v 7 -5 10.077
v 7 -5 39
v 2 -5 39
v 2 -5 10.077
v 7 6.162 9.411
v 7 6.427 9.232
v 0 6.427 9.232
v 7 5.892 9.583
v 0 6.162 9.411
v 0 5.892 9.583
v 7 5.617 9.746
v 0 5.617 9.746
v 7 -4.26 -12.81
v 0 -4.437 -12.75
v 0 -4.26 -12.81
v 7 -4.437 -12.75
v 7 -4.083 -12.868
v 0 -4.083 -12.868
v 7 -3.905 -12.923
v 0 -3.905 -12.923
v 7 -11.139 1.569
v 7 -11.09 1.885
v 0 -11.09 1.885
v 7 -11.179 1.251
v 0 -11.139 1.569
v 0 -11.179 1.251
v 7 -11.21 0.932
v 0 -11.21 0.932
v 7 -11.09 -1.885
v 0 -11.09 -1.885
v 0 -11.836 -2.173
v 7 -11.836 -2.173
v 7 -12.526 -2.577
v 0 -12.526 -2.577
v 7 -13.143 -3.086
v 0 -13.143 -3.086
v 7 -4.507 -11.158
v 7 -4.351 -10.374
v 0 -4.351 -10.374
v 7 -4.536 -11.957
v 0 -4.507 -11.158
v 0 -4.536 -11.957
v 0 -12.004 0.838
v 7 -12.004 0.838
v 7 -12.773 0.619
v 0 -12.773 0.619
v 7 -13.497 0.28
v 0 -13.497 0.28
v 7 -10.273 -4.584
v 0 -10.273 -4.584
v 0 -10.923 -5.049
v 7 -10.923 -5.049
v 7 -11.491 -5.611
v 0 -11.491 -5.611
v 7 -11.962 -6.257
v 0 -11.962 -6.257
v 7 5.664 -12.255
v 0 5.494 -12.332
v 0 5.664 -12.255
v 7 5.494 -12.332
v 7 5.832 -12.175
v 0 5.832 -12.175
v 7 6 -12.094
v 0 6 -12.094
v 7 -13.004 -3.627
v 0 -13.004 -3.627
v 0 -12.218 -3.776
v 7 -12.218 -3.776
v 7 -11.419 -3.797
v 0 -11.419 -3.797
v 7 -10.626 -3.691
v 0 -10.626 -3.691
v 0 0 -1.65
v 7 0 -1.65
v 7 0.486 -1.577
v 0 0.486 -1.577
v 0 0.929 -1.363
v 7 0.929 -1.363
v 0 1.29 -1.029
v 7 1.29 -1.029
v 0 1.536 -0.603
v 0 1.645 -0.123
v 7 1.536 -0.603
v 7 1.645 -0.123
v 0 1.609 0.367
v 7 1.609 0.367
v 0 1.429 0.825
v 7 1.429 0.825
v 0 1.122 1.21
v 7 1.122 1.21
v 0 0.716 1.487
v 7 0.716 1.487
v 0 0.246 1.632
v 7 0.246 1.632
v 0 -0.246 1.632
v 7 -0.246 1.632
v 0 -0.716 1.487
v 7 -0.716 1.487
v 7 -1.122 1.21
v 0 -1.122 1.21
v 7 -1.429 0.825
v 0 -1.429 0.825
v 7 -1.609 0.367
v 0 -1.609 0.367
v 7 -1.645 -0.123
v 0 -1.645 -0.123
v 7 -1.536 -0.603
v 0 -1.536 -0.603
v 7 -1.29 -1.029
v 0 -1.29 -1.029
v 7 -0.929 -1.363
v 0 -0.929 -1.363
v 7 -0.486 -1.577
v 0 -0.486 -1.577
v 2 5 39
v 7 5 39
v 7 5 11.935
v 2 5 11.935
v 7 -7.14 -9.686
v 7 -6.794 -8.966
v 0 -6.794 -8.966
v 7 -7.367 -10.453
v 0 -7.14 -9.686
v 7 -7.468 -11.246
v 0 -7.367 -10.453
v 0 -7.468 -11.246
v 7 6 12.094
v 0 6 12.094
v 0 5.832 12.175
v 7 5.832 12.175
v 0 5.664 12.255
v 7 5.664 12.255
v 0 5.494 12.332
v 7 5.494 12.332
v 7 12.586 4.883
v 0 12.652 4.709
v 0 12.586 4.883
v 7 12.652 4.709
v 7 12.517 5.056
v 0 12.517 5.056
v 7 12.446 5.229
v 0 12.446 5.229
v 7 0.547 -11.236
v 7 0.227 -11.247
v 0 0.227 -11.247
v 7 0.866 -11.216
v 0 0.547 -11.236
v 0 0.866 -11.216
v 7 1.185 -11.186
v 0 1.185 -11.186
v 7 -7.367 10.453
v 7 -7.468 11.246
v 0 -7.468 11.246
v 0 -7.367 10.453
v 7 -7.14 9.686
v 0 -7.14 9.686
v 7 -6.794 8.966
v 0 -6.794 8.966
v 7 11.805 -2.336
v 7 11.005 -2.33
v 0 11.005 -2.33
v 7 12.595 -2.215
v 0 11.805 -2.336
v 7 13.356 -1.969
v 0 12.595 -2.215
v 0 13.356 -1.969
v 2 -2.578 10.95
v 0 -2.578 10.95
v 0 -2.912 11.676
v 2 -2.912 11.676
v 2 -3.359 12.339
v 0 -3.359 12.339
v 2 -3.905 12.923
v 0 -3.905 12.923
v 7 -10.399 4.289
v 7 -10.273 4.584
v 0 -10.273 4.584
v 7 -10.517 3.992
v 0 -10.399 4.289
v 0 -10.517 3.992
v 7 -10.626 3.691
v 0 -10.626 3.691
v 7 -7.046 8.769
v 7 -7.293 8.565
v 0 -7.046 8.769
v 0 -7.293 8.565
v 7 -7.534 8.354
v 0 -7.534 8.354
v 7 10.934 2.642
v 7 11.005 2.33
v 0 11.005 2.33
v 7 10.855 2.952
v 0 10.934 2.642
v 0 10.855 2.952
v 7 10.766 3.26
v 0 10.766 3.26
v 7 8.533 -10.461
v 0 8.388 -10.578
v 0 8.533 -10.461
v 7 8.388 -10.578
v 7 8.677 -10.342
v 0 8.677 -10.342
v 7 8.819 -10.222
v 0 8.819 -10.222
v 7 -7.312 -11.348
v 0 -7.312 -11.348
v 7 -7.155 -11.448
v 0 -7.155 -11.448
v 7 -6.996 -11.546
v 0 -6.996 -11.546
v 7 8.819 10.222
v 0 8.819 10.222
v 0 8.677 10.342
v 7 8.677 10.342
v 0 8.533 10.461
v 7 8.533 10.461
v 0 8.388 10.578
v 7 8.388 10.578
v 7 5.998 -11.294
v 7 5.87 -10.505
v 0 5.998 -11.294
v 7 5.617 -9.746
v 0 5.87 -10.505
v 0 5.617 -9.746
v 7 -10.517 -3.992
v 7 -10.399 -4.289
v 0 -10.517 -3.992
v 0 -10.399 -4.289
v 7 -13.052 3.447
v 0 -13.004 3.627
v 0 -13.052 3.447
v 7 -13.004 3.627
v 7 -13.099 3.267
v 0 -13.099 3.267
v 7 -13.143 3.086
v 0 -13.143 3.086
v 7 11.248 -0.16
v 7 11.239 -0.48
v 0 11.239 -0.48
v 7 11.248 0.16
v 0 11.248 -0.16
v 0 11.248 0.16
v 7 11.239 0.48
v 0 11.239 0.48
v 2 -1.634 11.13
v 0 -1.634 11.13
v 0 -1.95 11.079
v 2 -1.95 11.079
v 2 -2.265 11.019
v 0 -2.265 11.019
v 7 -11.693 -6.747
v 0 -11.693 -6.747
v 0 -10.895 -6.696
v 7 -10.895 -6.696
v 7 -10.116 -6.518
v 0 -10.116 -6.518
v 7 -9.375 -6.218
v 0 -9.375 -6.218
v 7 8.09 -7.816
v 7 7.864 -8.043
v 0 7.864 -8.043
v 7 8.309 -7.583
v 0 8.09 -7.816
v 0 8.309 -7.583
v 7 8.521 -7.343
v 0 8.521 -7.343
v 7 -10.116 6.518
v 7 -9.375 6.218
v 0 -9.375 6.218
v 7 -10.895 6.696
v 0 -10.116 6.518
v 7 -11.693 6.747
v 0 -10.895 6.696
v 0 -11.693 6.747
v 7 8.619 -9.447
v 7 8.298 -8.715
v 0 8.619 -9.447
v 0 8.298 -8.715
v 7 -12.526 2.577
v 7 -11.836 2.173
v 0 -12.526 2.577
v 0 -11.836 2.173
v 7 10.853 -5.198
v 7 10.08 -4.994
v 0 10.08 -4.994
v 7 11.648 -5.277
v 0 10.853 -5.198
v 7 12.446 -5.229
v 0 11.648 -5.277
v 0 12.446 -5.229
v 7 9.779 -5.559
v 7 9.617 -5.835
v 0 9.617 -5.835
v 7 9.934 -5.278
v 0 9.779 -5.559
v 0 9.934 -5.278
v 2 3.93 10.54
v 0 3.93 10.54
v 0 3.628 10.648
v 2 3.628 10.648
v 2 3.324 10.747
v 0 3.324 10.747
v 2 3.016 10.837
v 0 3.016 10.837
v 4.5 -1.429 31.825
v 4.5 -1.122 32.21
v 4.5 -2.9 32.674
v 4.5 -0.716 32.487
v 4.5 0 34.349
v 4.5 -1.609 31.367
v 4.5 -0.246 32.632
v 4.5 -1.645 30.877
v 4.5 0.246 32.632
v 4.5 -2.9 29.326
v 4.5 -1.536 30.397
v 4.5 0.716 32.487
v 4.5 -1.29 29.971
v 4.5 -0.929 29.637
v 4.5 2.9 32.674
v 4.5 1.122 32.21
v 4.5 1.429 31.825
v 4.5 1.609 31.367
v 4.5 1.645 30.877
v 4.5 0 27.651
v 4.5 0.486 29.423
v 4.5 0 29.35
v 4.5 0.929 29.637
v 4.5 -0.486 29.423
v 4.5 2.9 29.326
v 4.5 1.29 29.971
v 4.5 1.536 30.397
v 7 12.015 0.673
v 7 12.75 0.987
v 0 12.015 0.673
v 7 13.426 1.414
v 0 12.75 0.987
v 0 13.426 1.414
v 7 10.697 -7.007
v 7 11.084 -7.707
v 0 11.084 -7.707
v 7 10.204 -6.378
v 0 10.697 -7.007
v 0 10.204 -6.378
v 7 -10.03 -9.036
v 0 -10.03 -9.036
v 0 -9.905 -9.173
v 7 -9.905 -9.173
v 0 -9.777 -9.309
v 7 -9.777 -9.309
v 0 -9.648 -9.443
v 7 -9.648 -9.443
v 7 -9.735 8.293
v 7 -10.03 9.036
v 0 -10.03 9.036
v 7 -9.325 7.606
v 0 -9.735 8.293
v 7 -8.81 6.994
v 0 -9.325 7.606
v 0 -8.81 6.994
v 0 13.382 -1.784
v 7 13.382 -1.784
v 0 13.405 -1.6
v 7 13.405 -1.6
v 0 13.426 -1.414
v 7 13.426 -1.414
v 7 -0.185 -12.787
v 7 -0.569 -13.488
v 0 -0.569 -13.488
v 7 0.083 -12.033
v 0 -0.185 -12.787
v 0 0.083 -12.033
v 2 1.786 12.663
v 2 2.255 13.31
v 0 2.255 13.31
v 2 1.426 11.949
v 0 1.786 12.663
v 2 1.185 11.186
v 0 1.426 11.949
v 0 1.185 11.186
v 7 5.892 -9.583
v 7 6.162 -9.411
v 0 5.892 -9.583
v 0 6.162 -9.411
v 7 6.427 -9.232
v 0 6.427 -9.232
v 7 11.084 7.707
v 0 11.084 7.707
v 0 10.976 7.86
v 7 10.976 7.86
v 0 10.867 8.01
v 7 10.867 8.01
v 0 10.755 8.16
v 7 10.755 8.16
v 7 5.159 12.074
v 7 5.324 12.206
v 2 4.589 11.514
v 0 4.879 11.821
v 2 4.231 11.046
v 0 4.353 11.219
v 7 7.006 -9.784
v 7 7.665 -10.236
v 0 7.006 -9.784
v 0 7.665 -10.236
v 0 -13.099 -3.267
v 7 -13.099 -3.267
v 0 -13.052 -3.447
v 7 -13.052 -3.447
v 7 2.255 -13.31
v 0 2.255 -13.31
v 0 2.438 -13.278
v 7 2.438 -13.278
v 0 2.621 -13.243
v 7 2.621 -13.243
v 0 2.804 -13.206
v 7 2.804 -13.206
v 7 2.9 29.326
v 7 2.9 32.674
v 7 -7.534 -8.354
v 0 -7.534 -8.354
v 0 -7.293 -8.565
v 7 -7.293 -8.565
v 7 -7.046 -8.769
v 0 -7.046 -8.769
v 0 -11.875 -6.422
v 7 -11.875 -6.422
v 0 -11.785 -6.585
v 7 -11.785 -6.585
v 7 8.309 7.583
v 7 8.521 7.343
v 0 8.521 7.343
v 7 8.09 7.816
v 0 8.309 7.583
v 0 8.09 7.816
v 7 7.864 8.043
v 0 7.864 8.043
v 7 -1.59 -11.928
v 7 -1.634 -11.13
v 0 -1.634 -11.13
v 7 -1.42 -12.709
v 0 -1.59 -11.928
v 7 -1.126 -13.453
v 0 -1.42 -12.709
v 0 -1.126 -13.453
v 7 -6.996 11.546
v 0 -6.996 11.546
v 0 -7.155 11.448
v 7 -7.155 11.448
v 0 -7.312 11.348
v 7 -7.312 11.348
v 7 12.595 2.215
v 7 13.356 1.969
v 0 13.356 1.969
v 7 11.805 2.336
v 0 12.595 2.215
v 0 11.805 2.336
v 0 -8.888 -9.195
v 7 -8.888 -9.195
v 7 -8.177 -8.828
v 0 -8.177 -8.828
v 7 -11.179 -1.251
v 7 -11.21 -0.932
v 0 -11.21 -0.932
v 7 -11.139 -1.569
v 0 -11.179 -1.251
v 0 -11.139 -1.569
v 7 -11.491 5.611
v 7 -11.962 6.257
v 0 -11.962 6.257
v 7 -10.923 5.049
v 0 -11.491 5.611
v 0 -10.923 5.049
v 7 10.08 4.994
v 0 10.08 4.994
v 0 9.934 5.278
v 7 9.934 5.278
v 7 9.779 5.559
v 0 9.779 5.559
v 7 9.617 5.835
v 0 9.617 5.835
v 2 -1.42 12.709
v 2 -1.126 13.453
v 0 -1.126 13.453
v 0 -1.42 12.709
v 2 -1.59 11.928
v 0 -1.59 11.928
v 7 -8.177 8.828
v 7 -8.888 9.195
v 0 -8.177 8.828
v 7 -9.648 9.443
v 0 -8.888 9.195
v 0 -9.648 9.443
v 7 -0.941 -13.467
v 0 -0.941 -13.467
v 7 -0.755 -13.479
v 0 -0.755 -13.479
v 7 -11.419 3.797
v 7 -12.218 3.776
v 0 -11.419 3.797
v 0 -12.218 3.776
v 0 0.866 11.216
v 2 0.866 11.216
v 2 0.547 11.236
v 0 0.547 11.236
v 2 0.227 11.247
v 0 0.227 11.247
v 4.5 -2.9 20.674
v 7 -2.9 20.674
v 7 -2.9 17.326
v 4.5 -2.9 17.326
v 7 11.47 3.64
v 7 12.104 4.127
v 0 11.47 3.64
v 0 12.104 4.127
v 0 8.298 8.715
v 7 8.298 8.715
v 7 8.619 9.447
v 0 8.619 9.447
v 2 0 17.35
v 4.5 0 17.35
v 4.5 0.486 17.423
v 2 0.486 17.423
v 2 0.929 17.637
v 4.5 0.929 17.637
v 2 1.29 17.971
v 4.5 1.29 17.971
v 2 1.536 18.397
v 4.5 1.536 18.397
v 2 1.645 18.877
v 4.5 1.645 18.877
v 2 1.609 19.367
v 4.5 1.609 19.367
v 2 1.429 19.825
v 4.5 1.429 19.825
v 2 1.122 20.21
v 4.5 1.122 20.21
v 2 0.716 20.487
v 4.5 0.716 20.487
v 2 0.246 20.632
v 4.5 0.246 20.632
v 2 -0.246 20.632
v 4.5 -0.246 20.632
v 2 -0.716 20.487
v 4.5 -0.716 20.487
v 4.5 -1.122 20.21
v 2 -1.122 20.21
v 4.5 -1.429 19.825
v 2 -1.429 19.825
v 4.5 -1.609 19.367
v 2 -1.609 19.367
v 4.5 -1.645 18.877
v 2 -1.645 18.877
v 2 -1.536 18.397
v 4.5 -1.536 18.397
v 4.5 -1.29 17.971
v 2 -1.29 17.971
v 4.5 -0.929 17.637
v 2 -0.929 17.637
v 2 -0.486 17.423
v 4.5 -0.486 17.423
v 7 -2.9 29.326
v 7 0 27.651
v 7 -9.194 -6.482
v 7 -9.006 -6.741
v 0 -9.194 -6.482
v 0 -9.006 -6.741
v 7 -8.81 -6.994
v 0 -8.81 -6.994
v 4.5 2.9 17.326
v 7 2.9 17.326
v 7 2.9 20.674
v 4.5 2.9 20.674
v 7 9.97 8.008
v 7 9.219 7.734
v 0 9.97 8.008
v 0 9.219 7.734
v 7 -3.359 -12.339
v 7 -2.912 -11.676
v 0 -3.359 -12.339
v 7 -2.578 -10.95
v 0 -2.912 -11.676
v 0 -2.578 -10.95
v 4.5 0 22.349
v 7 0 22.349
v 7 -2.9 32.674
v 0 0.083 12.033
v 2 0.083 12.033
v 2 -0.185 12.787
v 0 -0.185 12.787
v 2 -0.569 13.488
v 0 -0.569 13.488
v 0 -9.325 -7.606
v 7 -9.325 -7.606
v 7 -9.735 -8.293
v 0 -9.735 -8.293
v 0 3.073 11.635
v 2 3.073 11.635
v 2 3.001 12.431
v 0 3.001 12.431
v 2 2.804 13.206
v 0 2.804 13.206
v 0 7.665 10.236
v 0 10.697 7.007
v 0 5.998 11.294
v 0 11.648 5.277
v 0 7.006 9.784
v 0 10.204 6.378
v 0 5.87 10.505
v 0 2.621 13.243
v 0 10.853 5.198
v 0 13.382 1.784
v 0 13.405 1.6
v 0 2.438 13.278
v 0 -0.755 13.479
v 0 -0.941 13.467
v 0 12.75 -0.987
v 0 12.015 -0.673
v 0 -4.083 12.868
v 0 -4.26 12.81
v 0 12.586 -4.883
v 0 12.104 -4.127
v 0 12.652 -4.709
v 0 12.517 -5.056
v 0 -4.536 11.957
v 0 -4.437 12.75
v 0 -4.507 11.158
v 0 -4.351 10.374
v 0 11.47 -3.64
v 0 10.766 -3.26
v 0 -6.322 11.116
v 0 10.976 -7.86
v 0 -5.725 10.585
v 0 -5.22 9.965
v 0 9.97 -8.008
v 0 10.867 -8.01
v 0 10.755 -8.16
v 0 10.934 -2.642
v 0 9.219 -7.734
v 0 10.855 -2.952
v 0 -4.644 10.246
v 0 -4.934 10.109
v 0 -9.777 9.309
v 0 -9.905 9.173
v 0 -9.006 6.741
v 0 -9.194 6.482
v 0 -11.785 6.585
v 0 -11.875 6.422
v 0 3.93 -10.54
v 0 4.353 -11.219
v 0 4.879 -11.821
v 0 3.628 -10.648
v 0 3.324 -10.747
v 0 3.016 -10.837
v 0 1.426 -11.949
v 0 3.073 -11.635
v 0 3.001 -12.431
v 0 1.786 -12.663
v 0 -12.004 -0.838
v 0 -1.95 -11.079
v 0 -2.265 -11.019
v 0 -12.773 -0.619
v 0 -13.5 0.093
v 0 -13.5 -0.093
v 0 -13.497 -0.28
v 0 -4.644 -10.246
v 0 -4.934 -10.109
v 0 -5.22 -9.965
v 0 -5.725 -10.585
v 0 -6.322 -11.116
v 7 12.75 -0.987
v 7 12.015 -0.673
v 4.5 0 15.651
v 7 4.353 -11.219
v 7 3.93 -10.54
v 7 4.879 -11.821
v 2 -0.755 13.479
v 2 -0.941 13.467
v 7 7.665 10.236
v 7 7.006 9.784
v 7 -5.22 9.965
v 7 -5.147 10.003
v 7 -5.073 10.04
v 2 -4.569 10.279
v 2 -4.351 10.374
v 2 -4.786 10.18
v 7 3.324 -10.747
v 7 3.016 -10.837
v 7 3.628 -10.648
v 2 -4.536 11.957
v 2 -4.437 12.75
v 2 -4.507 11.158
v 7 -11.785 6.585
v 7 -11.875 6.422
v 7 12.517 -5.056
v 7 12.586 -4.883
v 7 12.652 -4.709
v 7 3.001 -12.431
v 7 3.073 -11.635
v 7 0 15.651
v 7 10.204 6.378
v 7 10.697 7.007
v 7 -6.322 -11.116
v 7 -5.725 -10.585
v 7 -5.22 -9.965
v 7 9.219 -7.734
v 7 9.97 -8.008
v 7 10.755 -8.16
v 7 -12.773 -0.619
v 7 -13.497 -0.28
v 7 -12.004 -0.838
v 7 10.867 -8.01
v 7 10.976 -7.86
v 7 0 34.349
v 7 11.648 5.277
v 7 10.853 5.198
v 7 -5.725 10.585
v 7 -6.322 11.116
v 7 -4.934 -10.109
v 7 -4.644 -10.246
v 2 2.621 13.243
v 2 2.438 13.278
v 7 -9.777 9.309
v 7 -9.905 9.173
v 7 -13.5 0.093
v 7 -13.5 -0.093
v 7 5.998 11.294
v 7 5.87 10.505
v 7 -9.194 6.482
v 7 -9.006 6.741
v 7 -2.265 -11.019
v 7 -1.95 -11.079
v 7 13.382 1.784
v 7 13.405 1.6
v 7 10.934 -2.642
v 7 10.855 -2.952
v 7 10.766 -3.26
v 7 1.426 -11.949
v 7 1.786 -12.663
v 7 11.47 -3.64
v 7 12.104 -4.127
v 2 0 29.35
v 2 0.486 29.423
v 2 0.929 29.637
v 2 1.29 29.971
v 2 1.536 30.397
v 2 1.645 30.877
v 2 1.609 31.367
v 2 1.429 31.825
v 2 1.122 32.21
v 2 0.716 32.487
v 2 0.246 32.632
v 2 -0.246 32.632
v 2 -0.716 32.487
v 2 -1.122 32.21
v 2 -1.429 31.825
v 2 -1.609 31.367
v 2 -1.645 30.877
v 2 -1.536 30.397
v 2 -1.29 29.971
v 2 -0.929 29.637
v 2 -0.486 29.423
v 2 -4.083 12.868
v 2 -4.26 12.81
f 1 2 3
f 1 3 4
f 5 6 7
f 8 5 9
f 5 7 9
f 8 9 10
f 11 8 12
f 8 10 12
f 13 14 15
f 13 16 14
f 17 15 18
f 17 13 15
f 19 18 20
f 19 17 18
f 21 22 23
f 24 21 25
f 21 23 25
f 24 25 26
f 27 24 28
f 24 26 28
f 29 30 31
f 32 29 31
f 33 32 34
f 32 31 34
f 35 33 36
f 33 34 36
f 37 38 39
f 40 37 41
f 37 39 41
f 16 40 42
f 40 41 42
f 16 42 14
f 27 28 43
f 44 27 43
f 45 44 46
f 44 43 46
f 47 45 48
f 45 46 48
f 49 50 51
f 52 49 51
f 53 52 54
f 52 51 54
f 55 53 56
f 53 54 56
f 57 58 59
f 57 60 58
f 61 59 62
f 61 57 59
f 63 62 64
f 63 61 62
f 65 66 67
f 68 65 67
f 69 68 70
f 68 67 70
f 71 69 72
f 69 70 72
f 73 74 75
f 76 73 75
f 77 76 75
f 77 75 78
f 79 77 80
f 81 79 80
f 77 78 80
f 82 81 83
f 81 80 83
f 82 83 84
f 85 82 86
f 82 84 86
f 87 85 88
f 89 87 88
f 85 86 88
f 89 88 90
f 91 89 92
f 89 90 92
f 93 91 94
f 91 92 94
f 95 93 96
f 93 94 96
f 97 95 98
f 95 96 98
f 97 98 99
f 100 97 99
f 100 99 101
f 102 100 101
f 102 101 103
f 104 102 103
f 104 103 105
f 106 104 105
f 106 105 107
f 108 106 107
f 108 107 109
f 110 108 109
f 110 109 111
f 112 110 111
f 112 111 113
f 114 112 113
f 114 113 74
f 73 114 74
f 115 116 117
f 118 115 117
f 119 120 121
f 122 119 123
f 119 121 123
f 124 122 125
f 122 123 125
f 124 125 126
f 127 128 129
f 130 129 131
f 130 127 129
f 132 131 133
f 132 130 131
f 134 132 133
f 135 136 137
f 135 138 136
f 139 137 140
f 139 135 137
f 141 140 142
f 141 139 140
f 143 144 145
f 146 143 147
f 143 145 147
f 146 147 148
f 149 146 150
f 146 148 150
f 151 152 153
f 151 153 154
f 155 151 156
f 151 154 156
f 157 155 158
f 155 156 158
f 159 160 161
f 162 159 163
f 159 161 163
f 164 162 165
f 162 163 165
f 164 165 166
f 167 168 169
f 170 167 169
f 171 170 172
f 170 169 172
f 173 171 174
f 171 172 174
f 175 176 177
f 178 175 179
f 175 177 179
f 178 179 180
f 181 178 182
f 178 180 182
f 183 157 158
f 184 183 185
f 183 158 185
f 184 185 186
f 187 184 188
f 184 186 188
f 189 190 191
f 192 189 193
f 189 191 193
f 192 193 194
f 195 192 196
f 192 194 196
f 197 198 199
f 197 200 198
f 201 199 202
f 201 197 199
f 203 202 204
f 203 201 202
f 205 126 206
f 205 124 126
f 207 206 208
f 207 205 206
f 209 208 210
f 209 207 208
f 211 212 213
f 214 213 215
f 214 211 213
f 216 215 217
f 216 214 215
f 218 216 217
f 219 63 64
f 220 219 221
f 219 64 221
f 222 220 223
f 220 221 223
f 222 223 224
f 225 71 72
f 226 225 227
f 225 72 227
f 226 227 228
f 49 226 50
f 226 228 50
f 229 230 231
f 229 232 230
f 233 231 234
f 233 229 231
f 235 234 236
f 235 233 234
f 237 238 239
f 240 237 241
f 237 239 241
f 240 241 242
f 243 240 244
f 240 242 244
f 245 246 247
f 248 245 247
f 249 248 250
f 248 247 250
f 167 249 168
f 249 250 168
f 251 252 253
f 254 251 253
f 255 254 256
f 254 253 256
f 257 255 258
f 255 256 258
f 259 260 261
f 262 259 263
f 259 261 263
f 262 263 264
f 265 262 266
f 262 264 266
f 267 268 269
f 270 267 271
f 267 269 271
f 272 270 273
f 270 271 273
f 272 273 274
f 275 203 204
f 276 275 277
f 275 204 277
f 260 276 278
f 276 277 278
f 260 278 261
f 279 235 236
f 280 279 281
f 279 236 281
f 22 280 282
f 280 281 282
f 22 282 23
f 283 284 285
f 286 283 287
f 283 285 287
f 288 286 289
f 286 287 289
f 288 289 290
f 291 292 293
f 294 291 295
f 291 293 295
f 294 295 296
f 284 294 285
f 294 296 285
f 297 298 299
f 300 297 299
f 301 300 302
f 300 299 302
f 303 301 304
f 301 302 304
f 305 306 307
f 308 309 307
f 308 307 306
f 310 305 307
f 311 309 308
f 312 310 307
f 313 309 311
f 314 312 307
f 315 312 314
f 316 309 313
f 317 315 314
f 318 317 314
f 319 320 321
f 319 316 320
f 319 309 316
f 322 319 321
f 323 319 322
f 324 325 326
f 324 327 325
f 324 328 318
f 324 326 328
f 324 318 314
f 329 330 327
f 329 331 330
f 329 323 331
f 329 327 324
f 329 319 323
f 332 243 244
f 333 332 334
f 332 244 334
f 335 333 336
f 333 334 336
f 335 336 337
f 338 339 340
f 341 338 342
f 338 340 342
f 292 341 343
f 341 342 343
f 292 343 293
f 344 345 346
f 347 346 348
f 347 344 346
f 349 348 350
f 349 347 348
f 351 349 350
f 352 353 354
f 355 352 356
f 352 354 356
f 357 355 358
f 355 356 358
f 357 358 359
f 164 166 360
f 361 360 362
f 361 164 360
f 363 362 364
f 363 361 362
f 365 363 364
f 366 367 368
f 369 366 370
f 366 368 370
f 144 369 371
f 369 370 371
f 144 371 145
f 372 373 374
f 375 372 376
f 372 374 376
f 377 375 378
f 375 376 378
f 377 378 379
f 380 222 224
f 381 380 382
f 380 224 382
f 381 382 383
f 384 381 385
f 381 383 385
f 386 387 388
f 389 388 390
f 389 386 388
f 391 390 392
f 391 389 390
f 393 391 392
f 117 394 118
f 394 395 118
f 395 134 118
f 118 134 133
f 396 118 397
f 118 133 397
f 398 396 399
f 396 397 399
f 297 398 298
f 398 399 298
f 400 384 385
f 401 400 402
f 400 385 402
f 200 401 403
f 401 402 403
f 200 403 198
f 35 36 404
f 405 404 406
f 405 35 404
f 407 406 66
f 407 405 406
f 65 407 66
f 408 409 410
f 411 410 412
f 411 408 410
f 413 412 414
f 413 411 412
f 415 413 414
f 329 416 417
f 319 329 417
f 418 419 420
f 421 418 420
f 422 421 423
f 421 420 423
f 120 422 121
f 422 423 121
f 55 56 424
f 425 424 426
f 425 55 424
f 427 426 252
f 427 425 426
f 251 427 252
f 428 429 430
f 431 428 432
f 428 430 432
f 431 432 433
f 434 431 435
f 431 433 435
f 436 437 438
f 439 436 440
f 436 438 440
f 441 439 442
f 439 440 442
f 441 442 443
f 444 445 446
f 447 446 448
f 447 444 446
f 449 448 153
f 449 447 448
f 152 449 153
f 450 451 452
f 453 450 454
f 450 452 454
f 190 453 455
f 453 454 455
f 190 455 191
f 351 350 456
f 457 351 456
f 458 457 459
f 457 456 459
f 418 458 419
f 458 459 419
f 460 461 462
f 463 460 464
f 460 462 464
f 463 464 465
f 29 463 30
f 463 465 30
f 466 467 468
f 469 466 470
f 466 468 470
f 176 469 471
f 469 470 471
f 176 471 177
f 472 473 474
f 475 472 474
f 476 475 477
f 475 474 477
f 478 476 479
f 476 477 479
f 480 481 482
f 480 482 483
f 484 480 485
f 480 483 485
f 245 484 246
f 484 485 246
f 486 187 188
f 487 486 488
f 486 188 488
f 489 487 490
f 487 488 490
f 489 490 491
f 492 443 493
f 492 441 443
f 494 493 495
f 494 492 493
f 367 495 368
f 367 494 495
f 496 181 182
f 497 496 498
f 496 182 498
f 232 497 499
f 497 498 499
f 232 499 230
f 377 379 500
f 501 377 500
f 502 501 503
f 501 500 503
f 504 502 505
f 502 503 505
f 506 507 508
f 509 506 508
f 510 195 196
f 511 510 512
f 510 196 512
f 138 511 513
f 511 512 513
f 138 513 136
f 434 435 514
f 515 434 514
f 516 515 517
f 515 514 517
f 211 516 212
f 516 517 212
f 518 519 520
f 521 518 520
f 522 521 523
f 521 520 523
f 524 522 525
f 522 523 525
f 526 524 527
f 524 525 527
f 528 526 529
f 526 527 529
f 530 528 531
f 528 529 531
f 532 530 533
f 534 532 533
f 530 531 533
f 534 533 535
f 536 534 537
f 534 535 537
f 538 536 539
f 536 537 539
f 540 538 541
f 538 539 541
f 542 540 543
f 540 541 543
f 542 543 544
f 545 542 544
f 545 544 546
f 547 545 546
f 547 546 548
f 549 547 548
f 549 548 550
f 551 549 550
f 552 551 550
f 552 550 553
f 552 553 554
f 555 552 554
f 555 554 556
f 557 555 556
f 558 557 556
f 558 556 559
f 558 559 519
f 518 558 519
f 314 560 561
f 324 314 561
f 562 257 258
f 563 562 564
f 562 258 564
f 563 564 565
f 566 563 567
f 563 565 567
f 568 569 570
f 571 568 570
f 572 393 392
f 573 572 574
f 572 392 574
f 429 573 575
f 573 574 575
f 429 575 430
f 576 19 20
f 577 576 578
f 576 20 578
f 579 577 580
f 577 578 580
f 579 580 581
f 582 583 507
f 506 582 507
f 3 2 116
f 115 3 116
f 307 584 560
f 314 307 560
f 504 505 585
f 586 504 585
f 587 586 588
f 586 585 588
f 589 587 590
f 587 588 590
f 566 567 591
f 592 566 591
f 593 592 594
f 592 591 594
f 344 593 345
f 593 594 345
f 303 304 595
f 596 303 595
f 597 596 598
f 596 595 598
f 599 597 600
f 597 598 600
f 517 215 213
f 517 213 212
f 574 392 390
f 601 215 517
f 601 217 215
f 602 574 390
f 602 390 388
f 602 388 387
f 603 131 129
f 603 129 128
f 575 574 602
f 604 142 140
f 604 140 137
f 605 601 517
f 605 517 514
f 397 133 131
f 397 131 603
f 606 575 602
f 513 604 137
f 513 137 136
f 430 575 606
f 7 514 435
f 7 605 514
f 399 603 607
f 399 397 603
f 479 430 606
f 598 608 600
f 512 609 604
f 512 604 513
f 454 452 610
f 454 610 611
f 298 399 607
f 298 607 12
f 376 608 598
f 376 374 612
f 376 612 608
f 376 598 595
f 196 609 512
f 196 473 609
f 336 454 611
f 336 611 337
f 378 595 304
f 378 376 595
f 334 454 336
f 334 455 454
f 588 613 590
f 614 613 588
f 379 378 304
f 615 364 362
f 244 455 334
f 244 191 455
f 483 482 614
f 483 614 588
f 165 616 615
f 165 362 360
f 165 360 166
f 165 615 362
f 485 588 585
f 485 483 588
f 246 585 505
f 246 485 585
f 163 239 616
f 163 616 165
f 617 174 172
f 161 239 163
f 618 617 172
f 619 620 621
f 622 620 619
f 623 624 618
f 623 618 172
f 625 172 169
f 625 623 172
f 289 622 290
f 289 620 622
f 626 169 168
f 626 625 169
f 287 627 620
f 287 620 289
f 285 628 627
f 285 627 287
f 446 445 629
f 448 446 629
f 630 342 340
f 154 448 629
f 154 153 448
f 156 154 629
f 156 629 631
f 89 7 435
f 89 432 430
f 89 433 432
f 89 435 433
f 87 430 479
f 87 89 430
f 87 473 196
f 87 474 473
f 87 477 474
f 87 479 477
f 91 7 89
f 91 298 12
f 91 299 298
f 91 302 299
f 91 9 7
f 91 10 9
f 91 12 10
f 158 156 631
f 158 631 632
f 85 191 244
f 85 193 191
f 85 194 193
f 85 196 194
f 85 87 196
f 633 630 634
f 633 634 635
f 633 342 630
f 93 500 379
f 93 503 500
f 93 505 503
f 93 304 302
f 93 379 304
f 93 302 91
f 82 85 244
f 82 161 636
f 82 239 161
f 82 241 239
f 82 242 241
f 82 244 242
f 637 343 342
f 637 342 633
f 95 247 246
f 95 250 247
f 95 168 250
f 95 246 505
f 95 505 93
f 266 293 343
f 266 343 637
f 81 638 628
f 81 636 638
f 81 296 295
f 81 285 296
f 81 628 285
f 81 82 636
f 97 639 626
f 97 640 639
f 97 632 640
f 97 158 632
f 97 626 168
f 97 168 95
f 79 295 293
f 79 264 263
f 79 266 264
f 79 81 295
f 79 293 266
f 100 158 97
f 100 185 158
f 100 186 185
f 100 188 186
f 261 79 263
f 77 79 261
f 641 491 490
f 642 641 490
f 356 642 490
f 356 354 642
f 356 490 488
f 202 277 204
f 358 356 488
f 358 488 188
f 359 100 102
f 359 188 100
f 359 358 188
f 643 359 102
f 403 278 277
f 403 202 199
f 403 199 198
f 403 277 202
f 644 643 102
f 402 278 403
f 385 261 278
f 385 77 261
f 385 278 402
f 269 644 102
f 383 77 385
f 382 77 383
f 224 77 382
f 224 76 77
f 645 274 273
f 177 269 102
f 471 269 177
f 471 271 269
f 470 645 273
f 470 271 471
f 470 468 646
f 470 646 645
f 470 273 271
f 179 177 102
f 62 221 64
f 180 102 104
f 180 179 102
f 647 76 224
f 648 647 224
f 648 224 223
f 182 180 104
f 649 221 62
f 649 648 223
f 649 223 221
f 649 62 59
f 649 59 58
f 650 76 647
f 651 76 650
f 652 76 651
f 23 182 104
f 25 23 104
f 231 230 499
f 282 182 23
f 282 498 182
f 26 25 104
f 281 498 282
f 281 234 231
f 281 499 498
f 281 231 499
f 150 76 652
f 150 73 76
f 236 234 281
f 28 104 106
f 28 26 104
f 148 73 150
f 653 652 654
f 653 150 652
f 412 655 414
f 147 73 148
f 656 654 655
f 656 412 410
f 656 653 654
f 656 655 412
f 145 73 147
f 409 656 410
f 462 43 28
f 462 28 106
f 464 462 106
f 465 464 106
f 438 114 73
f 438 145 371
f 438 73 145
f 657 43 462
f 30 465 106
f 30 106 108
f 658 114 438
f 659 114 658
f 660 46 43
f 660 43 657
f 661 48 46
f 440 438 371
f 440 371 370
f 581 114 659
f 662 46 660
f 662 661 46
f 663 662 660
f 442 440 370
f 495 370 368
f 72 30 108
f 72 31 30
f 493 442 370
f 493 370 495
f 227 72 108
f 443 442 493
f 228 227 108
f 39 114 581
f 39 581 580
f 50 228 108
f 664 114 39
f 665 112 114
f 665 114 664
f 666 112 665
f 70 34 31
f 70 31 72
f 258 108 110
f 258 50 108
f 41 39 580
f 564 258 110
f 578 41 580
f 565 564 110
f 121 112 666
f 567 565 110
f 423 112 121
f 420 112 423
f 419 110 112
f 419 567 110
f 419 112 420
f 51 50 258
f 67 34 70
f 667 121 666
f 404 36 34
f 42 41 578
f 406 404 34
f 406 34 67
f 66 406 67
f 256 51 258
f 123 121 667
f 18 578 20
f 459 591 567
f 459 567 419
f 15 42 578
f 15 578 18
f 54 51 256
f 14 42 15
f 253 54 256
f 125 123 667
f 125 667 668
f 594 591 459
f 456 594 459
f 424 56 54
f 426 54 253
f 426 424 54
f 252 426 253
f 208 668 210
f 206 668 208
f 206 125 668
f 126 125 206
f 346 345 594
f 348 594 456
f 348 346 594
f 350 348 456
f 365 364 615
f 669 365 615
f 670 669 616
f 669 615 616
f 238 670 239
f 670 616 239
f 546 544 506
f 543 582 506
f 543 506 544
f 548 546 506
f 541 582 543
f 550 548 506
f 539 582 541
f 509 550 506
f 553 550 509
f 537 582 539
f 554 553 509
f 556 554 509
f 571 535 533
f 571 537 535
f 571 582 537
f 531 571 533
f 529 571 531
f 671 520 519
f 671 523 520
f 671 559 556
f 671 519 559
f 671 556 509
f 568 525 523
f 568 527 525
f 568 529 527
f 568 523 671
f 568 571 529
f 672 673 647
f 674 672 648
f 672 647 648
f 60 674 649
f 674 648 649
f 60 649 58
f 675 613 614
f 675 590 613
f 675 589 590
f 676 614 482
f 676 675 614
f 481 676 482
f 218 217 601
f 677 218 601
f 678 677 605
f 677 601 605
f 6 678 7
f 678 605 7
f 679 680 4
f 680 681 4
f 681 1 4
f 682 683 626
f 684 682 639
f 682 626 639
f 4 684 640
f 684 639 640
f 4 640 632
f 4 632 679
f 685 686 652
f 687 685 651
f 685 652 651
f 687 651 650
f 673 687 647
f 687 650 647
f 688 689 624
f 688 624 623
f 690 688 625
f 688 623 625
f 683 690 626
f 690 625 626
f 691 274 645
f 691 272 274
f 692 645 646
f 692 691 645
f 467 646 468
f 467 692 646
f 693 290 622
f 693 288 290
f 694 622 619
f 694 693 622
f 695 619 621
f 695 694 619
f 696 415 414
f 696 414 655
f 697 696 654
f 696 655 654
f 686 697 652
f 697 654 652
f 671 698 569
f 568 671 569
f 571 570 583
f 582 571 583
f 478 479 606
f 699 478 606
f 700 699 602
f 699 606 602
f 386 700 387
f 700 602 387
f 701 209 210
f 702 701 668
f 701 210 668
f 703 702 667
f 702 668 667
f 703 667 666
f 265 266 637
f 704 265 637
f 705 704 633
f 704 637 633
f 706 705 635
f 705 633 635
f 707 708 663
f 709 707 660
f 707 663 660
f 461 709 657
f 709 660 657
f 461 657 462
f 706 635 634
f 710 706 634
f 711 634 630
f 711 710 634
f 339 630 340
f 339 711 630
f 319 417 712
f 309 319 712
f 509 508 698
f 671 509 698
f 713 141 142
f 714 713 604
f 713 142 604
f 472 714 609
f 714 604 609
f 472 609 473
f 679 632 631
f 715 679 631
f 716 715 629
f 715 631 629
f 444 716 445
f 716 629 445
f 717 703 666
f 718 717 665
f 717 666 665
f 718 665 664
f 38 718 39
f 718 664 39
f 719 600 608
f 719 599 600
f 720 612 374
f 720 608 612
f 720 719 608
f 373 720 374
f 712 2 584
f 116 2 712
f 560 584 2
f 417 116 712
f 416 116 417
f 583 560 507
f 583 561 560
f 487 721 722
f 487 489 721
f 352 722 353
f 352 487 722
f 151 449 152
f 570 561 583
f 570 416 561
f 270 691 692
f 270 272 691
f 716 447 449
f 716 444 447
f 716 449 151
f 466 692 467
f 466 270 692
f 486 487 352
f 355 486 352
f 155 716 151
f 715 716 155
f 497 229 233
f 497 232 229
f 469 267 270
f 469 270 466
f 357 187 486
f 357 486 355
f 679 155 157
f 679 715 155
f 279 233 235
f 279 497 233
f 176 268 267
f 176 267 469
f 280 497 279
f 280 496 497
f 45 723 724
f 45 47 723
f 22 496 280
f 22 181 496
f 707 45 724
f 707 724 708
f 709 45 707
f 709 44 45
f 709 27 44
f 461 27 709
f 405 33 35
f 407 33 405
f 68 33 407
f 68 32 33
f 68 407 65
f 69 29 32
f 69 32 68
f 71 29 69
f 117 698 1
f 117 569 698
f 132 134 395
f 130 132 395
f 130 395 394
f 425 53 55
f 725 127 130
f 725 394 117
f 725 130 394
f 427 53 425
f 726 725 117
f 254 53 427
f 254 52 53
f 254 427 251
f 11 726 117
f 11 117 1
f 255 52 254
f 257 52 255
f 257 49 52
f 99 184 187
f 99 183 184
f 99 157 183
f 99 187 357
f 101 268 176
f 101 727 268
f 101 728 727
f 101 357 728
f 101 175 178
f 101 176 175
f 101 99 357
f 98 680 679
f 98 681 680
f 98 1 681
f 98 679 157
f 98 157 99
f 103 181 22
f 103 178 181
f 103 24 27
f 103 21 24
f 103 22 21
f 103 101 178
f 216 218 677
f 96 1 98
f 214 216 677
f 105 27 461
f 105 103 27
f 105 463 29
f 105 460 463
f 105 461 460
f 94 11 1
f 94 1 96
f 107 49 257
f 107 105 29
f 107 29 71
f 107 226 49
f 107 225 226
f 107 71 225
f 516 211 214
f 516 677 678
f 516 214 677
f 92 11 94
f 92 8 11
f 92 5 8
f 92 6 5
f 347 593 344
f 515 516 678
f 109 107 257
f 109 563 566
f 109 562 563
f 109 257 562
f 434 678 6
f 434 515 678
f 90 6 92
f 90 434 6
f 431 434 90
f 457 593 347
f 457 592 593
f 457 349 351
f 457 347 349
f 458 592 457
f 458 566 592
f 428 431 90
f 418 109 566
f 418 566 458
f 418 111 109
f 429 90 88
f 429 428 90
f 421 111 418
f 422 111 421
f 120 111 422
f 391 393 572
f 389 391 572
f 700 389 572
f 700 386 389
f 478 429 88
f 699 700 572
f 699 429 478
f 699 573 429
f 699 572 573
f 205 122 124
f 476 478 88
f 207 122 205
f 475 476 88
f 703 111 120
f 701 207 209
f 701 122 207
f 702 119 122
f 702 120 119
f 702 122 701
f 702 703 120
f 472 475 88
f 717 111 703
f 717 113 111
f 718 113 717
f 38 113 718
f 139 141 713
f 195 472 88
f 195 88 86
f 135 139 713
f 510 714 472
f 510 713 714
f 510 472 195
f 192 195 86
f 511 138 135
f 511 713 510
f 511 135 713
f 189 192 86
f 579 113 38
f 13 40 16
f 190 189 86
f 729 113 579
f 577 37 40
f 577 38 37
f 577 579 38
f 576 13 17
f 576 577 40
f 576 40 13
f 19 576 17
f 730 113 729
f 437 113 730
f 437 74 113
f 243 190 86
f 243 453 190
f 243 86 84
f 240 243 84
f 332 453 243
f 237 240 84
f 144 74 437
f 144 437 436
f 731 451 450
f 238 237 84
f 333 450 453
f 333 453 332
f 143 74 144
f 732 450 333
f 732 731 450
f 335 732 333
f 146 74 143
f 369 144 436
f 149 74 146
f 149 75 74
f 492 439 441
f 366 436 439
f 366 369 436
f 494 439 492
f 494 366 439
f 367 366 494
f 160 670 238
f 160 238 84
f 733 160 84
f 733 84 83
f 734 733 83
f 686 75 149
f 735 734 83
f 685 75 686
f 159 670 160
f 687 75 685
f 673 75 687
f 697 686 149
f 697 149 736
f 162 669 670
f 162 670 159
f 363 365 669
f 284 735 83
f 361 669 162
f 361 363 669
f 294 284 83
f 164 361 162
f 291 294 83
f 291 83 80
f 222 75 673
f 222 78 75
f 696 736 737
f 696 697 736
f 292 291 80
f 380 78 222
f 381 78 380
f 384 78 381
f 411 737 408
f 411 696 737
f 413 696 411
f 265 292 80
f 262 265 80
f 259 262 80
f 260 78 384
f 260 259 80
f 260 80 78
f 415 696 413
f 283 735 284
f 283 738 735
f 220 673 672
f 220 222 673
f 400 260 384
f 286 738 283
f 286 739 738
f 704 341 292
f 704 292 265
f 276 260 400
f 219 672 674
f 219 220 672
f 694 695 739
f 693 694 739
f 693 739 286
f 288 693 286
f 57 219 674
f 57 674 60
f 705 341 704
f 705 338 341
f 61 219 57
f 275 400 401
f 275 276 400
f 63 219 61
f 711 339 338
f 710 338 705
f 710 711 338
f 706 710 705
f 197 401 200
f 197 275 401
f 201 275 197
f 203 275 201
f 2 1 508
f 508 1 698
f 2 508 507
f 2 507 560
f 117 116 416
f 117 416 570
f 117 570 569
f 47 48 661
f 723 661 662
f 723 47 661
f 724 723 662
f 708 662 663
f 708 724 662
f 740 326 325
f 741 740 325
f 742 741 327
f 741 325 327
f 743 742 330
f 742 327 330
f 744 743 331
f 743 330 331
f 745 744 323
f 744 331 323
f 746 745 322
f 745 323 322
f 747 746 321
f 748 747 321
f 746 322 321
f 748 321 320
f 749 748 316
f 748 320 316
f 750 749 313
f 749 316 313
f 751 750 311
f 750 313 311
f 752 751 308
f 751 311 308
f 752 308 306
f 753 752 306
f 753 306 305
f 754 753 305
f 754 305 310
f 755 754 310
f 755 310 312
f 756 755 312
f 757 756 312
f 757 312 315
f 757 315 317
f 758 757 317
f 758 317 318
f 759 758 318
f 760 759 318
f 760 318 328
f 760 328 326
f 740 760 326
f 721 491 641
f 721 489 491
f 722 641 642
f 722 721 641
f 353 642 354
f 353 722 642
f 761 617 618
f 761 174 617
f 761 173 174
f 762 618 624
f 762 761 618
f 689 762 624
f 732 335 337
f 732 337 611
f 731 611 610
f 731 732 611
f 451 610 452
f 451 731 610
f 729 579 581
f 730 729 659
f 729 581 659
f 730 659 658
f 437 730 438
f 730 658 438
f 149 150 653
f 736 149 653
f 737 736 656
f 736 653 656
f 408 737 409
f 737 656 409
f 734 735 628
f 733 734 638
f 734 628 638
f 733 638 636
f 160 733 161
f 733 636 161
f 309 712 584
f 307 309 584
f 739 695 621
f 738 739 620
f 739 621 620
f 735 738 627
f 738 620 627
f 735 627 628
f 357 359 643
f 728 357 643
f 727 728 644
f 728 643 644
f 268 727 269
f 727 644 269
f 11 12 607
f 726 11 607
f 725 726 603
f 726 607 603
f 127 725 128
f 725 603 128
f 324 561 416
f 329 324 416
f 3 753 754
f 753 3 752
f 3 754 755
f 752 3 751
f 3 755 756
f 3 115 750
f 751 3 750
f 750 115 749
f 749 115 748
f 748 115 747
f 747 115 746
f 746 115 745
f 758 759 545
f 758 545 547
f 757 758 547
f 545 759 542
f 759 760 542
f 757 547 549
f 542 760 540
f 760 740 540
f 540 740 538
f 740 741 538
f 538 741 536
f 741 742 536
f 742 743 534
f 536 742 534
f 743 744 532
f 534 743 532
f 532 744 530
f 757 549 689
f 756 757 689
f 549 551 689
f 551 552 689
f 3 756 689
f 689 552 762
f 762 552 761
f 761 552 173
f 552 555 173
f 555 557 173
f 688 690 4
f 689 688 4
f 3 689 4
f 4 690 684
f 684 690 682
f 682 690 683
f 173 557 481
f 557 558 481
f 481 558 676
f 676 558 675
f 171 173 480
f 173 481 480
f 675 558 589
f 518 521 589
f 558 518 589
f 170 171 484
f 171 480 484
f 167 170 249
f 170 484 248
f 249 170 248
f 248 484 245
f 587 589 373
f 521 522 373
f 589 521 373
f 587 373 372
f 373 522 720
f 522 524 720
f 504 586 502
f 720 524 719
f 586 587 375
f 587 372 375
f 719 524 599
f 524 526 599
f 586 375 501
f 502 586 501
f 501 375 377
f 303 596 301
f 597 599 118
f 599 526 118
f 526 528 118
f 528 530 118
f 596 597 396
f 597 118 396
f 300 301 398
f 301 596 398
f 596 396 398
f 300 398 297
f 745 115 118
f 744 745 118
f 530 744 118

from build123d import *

# Parameters (mm, degrees)
BASPROSKE_W         = 7
BASPROSKE_H         = 13.5
TOOTHCUT_DEPTH      = 21.334699408
TEETHCUTS_COUNT     = 25
TEETHCUTS_ANGLE     = 345.6
BORSKE_R            = 0.4
BORE_DEPTH          = 50.0000508
SKETCH_1_R          = 1.65
CUT_EXTRUDE_1_DEPTH = 10
SKETCH_2_W          = 30
SKETCH_2_H          = 10
SKETCH_2_R          = 1.65
EXTRUDE_2_DEPTH     = 5
CUT_EXTRUDE_2_DEPTH = 2.5


with BuildPart() as part:
    # BasProSke → Base-Revolve (revolve)
    with BuildSketch(Plane(origin=(0, 0, 0), x_dir=(1, 0, 0), z_dir=(0, 1, 0)), mode=Mode.PRIVATE) as base_revolve_sk:
        with Locations((3.5, 6.75)):
            Rectangle(BASPROSKE_W, BASPROSKE_H)
    revolve(base_revolve_sk.sketch.rotate(Axis((-10, 0, 0), (1, 0, 0)), 180), axis=Axis((-10, 0, 0), (1, 0, 0)))

    # TooCutSke → ToothCut (cut, through all)
    with BuildSketch(Plane(origin=(0, 0, 0), x_dir=(0, 0, -1), z_dir=(1, 0, 0))):
        with BuildLine():
            ThreePointArc((0.480087995, 11.238750665), (0, 11.249), (-0.480087995, 11.238750665))
            ThreePointArc((-0.480087995, 11.238750665), (-0.821124963, 12.40220054), (-1.432168974, 13.449361962))
            ThreePointArc((-1.432168974, 13.449361962), (0, 13.5254), (1.432168974, 13.449361962))
            ThreePointArc((1.432168974, 13.449361962), (0.821124963, 12.40220054), (0.480087995, 11.238750665))
        make_face()
    toothcut = extrude(amount=TOOTHCUT_DEPTH, mode=Mode.SUBTRACT)

    # TeethCuts: ToothCut ×25 about axis
    teethcuts_axis = Axis((-10, 0, 0), (1, 0, 0))
    for i in range(1, TEETHCUTS_COUNT):
        add(toothcut.rotate(teethcuts_axis, i * TEETHCUTS_ANGLE / (TEETHCUTS_COUNT - 1)), mode=Mode.SUBTRACT)

    # BorSke → Bore (cut, symmetric)
    with BuildSketch(Plane(origin=(0, 0, 0), x_dir=(0, 0, -1), z_dir=(1, 0, 0))):
        with Locations(Location((0, 0, 0), (0, 0, 180))):
            Circle(BORSKE_R)
    extrude(amount=BORE_DEPTH, both=True, mode=Mode.SUBTRACT)

    # 草图1 → 切除-拉伸1 (cut)
    with BuildSketch(Plane(origin=(7, 0, 0), x_dir=(0, 0, -1), z_dir=(1, 0, 0))):
        Circle(SKETCH_1_R)
    extrude(amount=-CUT_EXTRUDE_1_DEPTH, mode=Mode.SUBTRACT)

    # 草图2 → 凸台-拉伸2 (add)
    with BuildSketch(Plane(origin=(7, 0, 0), x_dir=(0, 0, -1), z_dir=(1, 0, 0))):
        with Locations((-24, 0)):
            Rectangle(SKETCH_2_W, SKETCH_2_H)
        with Locations((-31, 0)):
            Circle(SKETCH_2_R, mode=Mode.SUBTRACT)
        with Locations((-19, 0)):
            Circle(SKETCH_2_R, mode=Mode.SUBTRACT)
    extrude(amount=-EXTRUDE_2_DEPTH)

    # 草图3 → 切除-拉伸2 (cut)
    with BuildSketch(Plane(origin=(7, 0, 0), x_dir=(0, 0, -1), z_dir=(1, 0, 0))):
        Polygon((-27.651368439, 0), (-29.325684219, 2.9), (-32.674315781, 2.9), (-34.348631561, 0), (-32.674315781, -2.9), (-29.325684219, -2.9), align=None)
        Polygon((-15.651368439, 0), (-17.325684219, 2.9), (-20.674315781, 2.9), (-22.348631561, 0), (-20.674315781, -2.9), (-17.325684219, -2.9), align=None)
    extrude(amount=-CUT_EXTRUDE_2_DEPTH, mode=Mode.SUBTRACT)


solid = part.part
